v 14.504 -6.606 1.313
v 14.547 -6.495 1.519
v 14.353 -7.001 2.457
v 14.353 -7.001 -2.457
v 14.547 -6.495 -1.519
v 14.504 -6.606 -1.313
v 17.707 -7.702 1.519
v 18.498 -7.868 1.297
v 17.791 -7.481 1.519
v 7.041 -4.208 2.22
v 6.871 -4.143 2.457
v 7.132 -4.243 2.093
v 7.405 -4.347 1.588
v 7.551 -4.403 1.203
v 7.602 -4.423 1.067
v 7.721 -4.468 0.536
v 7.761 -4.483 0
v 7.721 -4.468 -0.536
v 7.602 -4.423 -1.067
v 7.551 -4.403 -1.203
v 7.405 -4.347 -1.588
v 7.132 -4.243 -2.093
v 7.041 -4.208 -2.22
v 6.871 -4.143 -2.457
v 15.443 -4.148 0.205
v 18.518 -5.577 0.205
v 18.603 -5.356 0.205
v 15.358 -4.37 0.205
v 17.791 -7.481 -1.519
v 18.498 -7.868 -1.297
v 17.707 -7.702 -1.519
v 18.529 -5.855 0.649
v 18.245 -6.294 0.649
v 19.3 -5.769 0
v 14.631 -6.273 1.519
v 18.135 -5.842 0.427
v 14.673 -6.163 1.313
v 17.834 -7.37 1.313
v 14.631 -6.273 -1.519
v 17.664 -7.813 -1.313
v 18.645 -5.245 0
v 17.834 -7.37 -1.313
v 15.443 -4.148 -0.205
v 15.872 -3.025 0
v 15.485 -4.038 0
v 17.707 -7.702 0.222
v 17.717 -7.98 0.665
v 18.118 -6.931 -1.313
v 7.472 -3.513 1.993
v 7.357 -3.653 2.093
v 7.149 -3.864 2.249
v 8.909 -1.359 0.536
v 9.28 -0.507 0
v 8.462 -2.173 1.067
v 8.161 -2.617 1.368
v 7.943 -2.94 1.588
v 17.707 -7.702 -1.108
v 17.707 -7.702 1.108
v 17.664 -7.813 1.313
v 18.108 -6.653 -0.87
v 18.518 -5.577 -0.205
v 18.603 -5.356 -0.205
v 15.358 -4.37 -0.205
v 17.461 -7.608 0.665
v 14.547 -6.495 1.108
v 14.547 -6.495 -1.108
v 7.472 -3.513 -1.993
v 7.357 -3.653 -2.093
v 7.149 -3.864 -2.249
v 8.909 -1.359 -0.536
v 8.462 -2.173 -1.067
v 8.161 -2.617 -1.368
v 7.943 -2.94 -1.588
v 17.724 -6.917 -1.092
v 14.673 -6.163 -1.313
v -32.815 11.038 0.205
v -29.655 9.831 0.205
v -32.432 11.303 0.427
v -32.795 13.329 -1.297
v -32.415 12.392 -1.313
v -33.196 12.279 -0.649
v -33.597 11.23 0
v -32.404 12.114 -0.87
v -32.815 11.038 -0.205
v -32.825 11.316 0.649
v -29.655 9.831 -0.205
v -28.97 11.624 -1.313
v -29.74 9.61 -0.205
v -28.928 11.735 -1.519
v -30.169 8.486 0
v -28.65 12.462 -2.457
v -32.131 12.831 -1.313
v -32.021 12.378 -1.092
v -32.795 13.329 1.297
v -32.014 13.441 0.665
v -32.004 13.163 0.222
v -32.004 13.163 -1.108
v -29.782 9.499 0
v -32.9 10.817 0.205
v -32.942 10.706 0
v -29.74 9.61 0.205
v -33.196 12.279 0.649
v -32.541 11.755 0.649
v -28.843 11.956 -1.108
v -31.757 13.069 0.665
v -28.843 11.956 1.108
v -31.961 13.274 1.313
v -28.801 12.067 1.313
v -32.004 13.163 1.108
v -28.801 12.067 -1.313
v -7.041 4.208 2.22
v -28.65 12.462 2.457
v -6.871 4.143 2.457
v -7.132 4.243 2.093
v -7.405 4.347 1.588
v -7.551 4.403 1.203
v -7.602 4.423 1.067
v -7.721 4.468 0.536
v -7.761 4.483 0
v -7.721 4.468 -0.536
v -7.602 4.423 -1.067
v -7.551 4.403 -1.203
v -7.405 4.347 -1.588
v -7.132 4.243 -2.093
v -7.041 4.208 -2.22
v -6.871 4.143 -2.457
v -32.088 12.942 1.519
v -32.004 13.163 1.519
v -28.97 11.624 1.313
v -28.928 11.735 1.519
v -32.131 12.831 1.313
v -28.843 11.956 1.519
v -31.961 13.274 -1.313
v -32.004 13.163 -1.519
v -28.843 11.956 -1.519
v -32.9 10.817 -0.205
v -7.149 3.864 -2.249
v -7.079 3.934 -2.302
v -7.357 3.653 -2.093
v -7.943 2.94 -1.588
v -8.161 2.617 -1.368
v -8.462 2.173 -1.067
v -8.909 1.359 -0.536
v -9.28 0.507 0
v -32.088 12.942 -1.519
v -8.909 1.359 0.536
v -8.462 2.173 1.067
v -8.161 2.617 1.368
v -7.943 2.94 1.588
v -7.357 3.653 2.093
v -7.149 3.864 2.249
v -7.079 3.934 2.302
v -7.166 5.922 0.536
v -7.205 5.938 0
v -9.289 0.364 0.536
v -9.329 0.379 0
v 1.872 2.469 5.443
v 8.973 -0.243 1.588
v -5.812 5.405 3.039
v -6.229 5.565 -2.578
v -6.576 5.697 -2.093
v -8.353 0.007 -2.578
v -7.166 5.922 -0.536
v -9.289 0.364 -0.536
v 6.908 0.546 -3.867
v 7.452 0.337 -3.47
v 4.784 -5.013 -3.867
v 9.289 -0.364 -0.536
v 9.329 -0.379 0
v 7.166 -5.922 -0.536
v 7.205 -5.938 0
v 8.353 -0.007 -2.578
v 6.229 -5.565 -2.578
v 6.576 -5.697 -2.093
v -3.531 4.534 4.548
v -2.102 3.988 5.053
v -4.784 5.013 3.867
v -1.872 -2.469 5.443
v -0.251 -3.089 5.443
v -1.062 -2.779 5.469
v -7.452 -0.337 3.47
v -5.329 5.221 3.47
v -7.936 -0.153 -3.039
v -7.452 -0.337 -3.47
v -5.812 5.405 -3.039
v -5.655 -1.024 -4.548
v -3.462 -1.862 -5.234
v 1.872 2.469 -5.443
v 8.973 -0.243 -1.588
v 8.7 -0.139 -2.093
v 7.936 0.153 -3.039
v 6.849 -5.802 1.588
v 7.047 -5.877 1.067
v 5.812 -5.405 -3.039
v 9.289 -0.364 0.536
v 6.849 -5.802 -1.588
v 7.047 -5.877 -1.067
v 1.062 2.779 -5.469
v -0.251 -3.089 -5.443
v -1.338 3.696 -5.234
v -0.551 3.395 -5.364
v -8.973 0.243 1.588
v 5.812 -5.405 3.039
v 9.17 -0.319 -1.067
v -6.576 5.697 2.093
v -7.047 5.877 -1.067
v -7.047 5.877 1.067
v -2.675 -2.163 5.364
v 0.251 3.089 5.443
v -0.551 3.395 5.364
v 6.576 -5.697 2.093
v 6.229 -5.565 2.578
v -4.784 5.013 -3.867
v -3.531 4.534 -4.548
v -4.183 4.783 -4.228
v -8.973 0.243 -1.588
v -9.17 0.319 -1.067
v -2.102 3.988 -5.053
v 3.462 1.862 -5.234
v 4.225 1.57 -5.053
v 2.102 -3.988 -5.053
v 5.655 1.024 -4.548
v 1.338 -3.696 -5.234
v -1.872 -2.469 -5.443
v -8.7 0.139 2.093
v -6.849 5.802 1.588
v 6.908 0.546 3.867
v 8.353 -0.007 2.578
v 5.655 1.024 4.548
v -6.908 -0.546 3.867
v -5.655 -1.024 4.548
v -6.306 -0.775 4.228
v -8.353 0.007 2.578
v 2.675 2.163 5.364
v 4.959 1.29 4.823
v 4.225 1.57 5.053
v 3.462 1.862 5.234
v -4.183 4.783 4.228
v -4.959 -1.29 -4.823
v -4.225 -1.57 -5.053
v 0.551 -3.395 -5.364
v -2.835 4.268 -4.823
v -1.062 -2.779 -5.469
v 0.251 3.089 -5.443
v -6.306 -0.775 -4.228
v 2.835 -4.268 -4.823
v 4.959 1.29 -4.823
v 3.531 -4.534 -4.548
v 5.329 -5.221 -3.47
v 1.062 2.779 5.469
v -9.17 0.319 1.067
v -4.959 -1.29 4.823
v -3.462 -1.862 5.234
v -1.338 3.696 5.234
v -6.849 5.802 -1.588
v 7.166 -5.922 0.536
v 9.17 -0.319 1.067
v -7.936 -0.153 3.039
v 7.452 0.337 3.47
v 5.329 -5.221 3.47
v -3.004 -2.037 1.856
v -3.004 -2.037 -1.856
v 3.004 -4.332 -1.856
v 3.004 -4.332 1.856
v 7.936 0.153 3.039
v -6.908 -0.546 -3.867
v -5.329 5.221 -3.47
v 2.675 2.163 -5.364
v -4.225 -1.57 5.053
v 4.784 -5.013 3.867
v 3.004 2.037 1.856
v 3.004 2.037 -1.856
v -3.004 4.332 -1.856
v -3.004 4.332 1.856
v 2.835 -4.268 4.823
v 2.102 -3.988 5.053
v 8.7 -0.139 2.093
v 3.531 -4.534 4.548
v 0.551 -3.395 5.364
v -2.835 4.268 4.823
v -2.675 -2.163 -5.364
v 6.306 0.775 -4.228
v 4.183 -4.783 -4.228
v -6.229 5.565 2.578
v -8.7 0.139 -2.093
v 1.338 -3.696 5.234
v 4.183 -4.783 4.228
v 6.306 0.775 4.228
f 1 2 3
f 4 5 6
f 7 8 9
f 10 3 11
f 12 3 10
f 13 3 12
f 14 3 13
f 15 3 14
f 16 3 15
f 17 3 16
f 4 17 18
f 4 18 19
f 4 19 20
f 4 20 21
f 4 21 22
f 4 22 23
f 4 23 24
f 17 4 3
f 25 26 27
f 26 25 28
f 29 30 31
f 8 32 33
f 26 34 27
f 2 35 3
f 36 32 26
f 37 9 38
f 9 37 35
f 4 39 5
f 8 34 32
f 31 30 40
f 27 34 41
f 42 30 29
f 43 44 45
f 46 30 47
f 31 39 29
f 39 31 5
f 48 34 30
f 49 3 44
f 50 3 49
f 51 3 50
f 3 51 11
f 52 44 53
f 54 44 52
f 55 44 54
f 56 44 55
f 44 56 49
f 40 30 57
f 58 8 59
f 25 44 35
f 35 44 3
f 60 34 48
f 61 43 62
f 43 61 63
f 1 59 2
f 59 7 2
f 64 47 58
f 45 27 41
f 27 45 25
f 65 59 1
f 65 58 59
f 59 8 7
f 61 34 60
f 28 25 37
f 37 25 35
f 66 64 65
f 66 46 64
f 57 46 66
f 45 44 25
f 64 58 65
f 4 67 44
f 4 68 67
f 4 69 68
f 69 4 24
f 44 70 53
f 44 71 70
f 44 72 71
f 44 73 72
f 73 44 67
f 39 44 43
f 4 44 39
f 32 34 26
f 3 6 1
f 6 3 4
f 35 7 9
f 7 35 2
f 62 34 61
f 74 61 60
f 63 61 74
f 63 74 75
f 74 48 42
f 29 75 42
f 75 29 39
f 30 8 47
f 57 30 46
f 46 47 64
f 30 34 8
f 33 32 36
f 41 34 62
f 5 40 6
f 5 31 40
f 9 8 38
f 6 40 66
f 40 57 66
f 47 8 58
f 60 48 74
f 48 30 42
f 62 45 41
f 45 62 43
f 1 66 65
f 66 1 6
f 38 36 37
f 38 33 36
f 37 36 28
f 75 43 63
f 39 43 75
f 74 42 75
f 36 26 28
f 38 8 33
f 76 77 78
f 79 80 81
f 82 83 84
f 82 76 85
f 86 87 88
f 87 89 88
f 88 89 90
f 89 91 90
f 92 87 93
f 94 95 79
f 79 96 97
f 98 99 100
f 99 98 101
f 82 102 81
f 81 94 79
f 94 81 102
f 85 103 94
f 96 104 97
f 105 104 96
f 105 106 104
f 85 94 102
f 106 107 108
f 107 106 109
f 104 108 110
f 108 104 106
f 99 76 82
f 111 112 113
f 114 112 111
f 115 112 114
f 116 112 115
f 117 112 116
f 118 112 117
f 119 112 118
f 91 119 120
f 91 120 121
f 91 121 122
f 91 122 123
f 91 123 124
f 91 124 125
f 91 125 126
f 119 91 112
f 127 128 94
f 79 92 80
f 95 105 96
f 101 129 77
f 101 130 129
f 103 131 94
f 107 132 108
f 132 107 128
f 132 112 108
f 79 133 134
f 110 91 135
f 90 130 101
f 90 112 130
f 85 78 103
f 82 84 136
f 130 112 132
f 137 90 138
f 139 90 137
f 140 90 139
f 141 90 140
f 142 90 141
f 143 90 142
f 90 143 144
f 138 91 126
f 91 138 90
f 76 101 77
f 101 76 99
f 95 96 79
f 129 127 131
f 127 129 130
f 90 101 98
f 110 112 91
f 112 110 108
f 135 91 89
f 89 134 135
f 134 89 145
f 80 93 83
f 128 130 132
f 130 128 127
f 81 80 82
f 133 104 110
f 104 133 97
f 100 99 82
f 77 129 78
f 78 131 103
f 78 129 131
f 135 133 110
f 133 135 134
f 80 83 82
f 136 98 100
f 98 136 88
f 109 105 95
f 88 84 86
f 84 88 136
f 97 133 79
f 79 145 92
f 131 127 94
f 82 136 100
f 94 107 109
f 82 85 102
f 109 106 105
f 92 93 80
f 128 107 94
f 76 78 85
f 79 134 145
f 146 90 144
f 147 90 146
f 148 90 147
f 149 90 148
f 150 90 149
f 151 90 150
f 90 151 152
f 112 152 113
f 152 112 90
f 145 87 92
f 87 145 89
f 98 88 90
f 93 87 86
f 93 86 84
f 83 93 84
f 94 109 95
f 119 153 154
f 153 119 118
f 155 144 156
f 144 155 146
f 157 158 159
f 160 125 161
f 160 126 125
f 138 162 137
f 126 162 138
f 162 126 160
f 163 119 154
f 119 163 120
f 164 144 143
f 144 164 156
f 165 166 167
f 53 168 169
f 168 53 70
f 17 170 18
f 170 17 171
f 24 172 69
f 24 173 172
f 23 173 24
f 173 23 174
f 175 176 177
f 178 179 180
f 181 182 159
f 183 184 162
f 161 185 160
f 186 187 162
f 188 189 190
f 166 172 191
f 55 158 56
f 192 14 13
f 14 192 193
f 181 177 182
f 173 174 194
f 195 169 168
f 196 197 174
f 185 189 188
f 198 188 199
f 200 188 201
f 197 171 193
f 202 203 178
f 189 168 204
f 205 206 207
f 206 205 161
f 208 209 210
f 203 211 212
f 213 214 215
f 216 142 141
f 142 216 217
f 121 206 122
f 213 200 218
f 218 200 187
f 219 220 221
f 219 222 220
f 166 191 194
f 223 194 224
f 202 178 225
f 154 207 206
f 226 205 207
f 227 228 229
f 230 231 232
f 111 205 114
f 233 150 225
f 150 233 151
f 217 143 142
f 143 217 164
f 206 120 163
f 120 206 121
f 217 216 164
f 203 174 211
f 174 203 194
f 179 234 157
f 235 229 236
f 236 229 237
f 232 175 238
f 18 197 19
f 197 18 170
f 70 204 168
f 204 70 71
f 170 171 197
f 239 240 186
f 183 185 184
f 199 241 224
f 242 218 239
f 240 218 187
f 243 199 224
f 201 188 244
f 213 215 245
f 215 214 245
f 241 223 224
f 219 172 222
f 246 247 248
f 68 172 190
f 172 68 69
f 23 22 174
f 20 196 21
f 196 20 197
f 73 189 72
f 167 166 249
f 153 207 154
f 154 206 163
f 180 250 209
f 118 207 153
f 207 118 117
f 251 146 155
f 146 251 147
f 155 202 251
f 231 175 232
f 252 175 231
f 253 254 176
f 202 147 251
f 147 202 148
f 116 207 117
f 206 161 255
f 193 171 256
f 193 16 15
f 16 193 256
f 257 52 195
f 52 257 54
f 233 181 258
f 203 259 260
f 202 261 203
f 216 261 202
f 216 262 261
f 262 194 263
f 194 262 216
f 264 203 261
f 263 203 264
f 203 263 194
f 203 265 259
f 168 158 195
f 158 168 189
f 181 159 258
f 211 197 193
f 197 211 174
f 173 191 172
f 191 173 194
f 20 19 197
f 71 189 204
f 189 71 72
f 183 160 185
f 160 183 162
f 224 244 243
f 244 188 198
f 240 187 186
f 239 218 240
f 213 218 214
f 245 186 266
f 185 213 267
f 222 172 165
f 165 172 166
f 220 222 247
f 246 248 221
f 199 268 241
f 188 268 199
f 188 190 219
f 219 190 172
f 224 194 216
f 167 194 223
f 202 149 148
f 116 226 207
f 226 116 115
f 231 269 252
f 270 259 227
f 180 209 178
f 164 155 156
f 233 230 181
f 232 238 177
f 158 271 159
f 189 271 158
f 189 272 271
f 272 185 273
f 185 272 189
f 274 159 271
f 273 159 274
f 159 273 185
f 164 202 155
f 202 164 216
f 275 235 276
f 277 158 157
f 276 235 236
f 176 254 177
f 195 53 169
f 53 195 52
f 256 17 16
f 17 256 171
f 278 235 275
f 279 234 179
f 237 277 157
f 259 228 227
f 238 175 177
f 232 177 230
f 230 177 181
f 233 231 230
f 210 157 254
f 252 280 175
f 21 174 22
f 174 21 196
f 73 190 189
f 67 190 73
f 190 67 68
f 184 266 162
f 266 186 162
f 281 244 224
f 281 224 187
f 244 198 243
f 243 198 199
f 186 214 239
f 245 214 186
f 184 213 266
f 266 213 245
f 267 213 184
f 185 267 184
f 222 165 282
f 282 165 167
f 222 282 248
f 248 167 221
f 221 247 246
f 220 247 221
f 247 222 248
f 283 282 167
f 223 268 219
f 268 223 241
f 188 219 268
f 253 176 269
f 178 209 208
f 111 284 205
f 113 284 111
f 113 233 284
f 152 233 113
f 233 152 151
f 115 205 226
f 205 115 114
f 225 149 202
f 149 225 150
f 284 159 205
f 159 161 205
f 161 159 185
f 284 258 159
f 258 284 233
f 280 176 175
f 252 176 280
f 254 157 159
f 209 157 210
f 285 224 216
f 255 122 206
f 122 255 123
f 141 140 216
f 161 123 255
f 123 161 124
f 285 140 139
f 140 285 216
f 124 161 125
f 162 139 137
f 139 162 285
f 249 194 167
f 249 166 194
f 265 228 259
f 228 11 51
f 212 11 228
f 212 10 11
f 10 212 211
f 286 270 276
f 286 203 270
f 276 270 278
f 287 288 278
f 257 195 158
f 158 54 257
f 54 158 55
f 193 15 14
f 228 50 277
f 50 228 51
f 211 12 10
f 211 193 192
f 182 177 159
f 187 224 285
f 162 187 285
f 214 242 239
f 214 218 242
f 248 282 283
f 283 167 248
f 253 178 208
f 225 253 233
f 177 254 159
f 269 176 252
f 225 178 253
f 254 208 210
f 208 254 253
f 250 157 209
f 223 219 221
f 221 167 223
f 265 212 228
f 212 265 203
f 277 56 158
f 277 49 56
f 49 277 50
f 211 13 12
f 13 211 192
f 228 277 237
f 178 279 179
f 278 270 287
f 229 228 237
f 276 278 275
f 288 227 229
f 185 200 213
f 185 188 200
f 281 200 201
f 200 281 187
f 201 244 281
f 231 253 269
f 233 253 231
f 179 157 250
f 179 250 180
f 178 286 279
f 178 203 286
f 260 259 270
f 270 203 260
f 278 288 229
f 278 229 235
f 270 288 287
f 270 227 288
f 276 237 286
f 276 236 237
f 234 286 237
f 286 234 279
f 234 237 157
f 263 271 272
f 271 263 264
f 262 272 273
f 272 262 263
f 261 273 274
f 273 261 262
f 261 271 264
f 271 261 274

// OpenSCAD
sc=(4+2*sqrt(5))/cos(16.5);
points=[[ -2.61803398874989, 0, 1 ],[ -2.19098300562505, 0, 0.635254915624213 ],[ -2.14057647468726, -0.0815594803123161, 0.767220926874316 ],[ -2.14057647468726, 0.0815594803123161, 0.767220926874316 ],[ -2.11803398874989, 0, 0.572949016875158 ],[ -2.11271242968684, -0.0258313903114757, 0.586881039375368 ],[ -2.11271242968684, 0.0258313903114757, 0.586881039375368 ],[ -2.10206931156074, -0.0815594803123161, 0.649186938124423 ],[ -2.10206931156074, -0.0258313903114757, 0.614745084375787 ],[ -2.10206931156074, 0.0258313903114757, 0.614745084375787 ],[ -2.09016994374947, -0.163118960624632, 0.899186938124423 ],[ -2.09016994374947, 0, 0.899186938124423 ],[ -2.09016994374947, 0.163118960624632, 0.899186938124423 ],[ -2.06762745781211, -0.0815594803123161, 0.704915028125263 ],[ -2.056984339686, -0.0536954353118961, 0.649186938124423 ],[ -2.05040653093779, 0.109423525312736, 0.75 ],[ -2.05040653093779, 0.165151615313576, 0.784441853748632 ],[ -2.01596467718916, -0.165151615313576, 0.840169943749475 ],[ -2.01596467718916, 0.165151615313576, 0.840169943749475 ],[ -2.0106431181261, -0.190983005625053, 0.854101966249685 ],[ -2.0106431181261, 0.190983005625053, 0.854101966249685 ],[ -2.00532155906305, 0.137287570313157, 0.784441853748632 ],[ -2, -0.190983005625053, 0.881966011250105 ],[ -2, -0.139320225002102, 0.881966011250105 ],[ -2, -0.0835921350012612, 0.916407864998739 ],[ -2, -0.0278640450004204, 0.881966011250105 ],[ -2, 0.139320225002102, 0.881966011250105 ],[ -2, 0.190983005625053, 0.881966011250105 ],[ -1.99467844093695, -0.165151615313576, 0.895898033750315 ],[ -1.99467844093695, 0.165151615313576, 0.895898033750315 ],[ -1.97213595499958, -0.0835921350012612, 0.871322893124002 ],[ -1.80901699437495, 0, 0.309016994374947 ],[ -1.76038431645818, 0, 0.436338998124983 ],[ -1.75506275739512, -0.0258313903114757, 0.450271020625192 ],[ -1.75506275739512, 0.0258313903114757, 0.450271020625192 ],[ -1.74441963926902, -0.0258313903114757, 0.478135065625613 ],[ -1.74441963926902, 0.0258313903114757, 0.478135065625613 ],[ -1.65831500489744, -0.165151615313576, 0.703559924999299 ],[ -1.65831500489744, 0.165151615313576, 0.703559924999299 ],[ -1.65299344583438, -0.190983005625053, 0.71749194749951 ],[ -1.65299344583438, 0.190983005625053, 0.71749194749951 ],[ -1.64235032770828, -0.190983005625053, 0.74535599249993 ],[ -1.64235032770828, -0.139320225002102, 0.74535599249993 ],[ -1.64235032770828, 0.139320225002102, 0.74535599249993 ],[ -1.64235032770828, 0.190983005625053, 0.74535599249993 ],[ -1.63702876864523, -0.165151615313576, 0.75928801500014 ],[ -1.63702876864523, 0.165151615313576, 0.75928801500014 ],[ -1.61803398874989, -0.309016994374947, 0.809016994374947 ],[ -1.61803398874989, 0.309016994374947, 0.809016994374947 ],[ -0.809016994374947, 0, -0.0729490168751576 ],[ -0.618033988749895, -0.309016994374947, 0.427050983124842 ],[ -0.618033988749895, 0.309016994374947, 0.427050983124842 ],[ -0.309016994374947, -0.190983005625053, -1 ],[ -0.309016994374947, -0.190983005625053, 1 ],[ -0.309016994374947, 0.190983005625053, -1 ],[ -0.309016994374947, 0.190983005625053, 1 ],[ 0, 0, -1.80901699437495 ],[ 0, 0, 0 ],[ 0, 0, 1.80901699437495 ],[ 0.309016994374947, -0.190983005625053, -1 ],[ 0.309016994374947, -0.190983005625053, 1 ],[ 0.309016994374947, 0.190983005625053, -1 ],[ 0.309016994374947, 0.190983005625053, 1 ],[ 0.618033988749895, -0.309016994374947, -0.427050983124842 ],[ 0.618033988749895, 0.309016994374947, -0.427050983124842 ],[ 0.809016994374947, 0, 0.0729490168751576 ],[ 3.23606797749979, -0.309016994374947, -1.42705098312484 ],[ 3.23606797749979, 0.309016994374947, -1.42705098312484 ],[ 3.25506275739512, -0.165151615313576, -1.37732200375004 ],[ 3.25506275739512, 0.165151615313576, -1.37732200375004 ],[ 3.26038431645818, -0.190983005625053, -1.36338998124982 ],[ 3.26038431645818, -0.139320225002102, -1.36338998124982 ],[ 3.26038431645818, 0.139320225002102, -1.36338998124982 ],[ 3.26038431645818, 0.190983005625053, -1.36338998124982 ],[ 3.27102743458428, -0.190983005625053, -1.3355259362494 ],[ 3.27102743458428, 0.190983005625053, -1.3355259362494 ],[ 3.27634899364733, -0.165151615313576, -1.32159391374919 ],[ 3.27634899364733, 0.165151615313576, -1.32159391374919 ],[ 3.36245362801892, -0.0258313903114757, -1.09616905437551 ],[ 3.36245362801892, 0.0258313903114757, -1.09616905437551 ],[ 3.37309674614502, -0.0258313903114757, -1.06830500937509 ],[ 3.37309674614502, 0.0258313903114757, -1.06830500937509 ],[ 3.37841830520807, 0, -1.05437298687488 ],[ 3.42705098312484, 0, -0.927050983124842 ],[ 3.59016994374947, -0.0835921350012612, -1.4893568818739 ],[ 3.61271242968684, -0.165151615313576, -1.51393202250021 ],[ 3.61271242968684, 0.165151615313576, -1.51393202250021 ],[ 3.61803398874989, -0.190983005625053, -1.5 ],[ 3.61803398874989, -0.139320225002102, -1.5 ],[ 3.61803398874989, -0.0835921350012612, -1.53444185374863 ],[ 3.61803398874989, -0.0278640450004204, -1.5 ],[ 3.61803398874989, 0.139320225002102, -1.5 ],[ 3.61803398874989, 0.190983005625053, -1.5 ],[ 3.62335554781295, 0.137287570313157, -1.40247584249853 ],[ 3.628677106876, -0.190983005625053, -1.47213595499958 ],[ 3.628677106876, 0.190983005625053, -1.47213595499958 ],[ 3.63399866593905, -0.165151615313576, -1.45820393249937 ],[ 3.63399866593905, 0.165151615313576, -1.45820393249937 ],[ 3.66844051968768, 0.109423525312736, -1.36803398874989 ],[ 3.66844051968768, 0.165151615313576, -1.40247584249853 ],[ 3.6750183284359, -0.0536954353118961, -1.26722092687432 ],[ 3.685661446562, -0.0815594803123161, -1.32294901687516 ],[ 3.70820393249937, -0.163118960624632, -1.51722092687432 ],[ 3.70820393249937, 0, -1.51722092687432 ],[ 3.70820393249937, 0.163118960624632, -1.51722092687432 ],[ 3.72010330031063, -0.0815594803123161, -1.26722092687432 ],[ 3.72010330031063, -0.0258313903114757, -1.23277907312568 ],[ 3.72010330031063, 0.0258313903114757, -1.23277907312568 ],[ 3.73074641843674, -0.0258313903114757, -1.20491502812526 ],[ 3.73074641843674, 0.0258313903114757, -1.20491502812526 ],[ 3.73606797749979, 0, -1.19098300562505 ],[ 3.75861046343716, -0.0815594803123161, -1.38525491562421 ],[ 3.75861046343716, 0.0815594803123161, -1.38525491562421 ],[ 3.80901699437495, 0, -1.25328890437411 ],[ 4.23606797749979, 0, -1.61803398874989 ]];

scale(sc) rotate([90,0,0]) rotate([0,0,180]) difference () {
union() {
    rotate([0,20.91,0]) scale([1,0.9,0.9]) rotate([0,-20.91,0]) union() {
        polyhedron(points,faces=[[ 45, 41, 47 ],[ 44, 46, 48 ],[ 10, 19, 22 ],[ 51, 48, 47, 50 ],[ 8, 5, 33, 35 ],[ 12, 27, 20 ],[ 10, 7, 13 ],[ 1, 5, 8 ],[ 49, 51, 50 ],[ 41, 39, 47 ],[ 8, 14, 7 ],[ 17, 37, 39, 19 ],[ 40, 44, 48 ],[ 2, 1, 7 ],[ 12, 29, 27 ],[ 1, 4, 5 ],[ 12, 20, 18 ],[ 32, 34, 31 ],[ 12, 24, 25 ],[ 7, 10, 2 ],[ 20, 27, 44, 40 ],[ 16, 1, 3 ],[ 50, 47, 31, 49 ],[ 12, 26, 29 ],[ 10, 28, 23 ],[ 39, 33, 31, 47 ],[ 1, 16, 15 ],[ 3, 12, 16 ],[ 9, 36, 34, 6 ],[ 28, 22, 41, 45 ],[ 23, 30, 24 ],[ 5, 4, 32, 33 ],[ 23, 28, 45, 42 ],[ 10, 22, 28 ],[ 1, 15, 9 ],[ 37, 35, 33, 39 ],[ 26, 25, 30, 42, 43 ],[ 33, 32, 31 ],[ 30, 23, 42 ],[ 49, 31, 48, 51 ],[ 34, 40, 48, 31 ],[ 1, 8, 7 ],[ 46, 45, 47, 48 ],[ 22, 19, 39, 41 ],[ 1, 9, 6 ],[ 9, 15, 21, 38, 36 ],[ 18, 21, 16 ],[ 18, 20, 40, 38 ],[ 11, 10, 24 ],[ 12, 25, 26 ],[ 25, 24, 30 ],[ 1, 2, 10, 11, 12, 3 ],[ 13, 7, 14 ],[ 1, 6, 4 ],[ 27, 29, 46, 44 ],[ 10, 17, 19 ],[ 26, 43, 46, 29 ],[ 10, 23, 24 ],[ 15, 16, 21 ],[ 12, 18, 16 ],[ 4, 6, 34, 32 ],[ 43, 42, 45, 46 ],[ 17, 13, 14, 35, 37 ],[ 36, 38, 40, 34 ],[ 21, 18, 38 ],[ 14, 8, 35 ],[ 24, 12, 11 ],[ 10, 13, 17 ]]);
        polyhedron(points,faces=[[ 100, 106, 78 ],[ 112, 104, 99 ],[ 113, 98, 107 ],[ 113, 106, 105 ],[ 79, 77, 75, 81 ],[ 81, 75, 67, 83 ],[ 93, 97, 77 ],[ 89, 104, 103 ],[ 104, 90, 91 ],[ 108, 110, 82, 80 ],[ 113, 111, 102, 103, 104, 112 ],[ 103, 102, 89 ],[ 102, 105, 101 ],[ 91, 90, 84, 71, 72 ],[ 105, 102, 111 ],[ 88, 85, 68, 71 ],[ 72, 71, 68, 69 ],[ 113, 108, 106 ],[ 67, 66, 63, 64 ],[ 102, 94, 87 ],[ 104, 97, 99 ],[ 90, 89, 84 ],[ 76, 78, 80, 74 ],[ 63, 65, 64 ],[ 102, 101, 96 ],[ 85, 87, 70, 68 ],[ 68, 70, 66 ],[ 104, 86, 92 ],[ 73, 69, 67 ],[ 74, 80, 83, 66 ],[ 101, 105, 100 ],[ 113, 107, 109 ],[ 70, 74, 66 ],[ 83, 67, 64, 65 ],[ 106, 108, 80, 78 ],[ 104, 89, 90 ],[ 96, 76, 74, 94 ],[ 80, 82, 83 ],[ 69, 68, 66, 67 ],[ 75, 73, 67 ],[ 95, 92, 73, 75 ],[ 98, 99, 93 ],[ 87, 94, 74, 70 ],[ 99, 113, 112 ],[ 91, 72, 69, 86 ],[ 113, 110, 108 ],[ 96, 101, 100, 78, 76 ],[ 92, 86, 69, 73 ],[ 113, 99, 98 ],[ 110, 109, 81, 82 ],[ 88, 84, 89 ],[ 107, 79, 81, 109 ],[ 104, 91, 86 ],[ 104, 95, 97 ],[ 102, 96, 94 ],[ 113, 109, 110 ],[ 102, 85, 88 ],[ 111, 113, 105 ],[ 84, 88, 71 ],[ 97, 93, 99 ],[ 102, 87, 85 ],[ 106, 100, 105 ],[ 104, 92, 95 ],[ 66, 83, 65, 63 ],[ 97, 95, 75, 77 ],[ 82, 81, 83 ],[ 107, 98, 93, 77, 79 ],[ 102, 88, 89 ]]);
        }
    rotate([0,20.91,0]) scale([1,0.618,1]) cylinder(h=5.95/sc,r1=8.85/sc,r2=8.85/sc,center=true,$fn=64);
    }
scale([1.1,1.1,1]) polyhedron(points,faces=[[ 62, 61, 59, 60 ],[ 54, 55, 53, 52 ],[ 54, 61, 62, 55 ],[ 53, 55, 62, 60 ],[ 53, 60, 59, 52 ],[ 59, 61, 54, 52 ]]);
}
